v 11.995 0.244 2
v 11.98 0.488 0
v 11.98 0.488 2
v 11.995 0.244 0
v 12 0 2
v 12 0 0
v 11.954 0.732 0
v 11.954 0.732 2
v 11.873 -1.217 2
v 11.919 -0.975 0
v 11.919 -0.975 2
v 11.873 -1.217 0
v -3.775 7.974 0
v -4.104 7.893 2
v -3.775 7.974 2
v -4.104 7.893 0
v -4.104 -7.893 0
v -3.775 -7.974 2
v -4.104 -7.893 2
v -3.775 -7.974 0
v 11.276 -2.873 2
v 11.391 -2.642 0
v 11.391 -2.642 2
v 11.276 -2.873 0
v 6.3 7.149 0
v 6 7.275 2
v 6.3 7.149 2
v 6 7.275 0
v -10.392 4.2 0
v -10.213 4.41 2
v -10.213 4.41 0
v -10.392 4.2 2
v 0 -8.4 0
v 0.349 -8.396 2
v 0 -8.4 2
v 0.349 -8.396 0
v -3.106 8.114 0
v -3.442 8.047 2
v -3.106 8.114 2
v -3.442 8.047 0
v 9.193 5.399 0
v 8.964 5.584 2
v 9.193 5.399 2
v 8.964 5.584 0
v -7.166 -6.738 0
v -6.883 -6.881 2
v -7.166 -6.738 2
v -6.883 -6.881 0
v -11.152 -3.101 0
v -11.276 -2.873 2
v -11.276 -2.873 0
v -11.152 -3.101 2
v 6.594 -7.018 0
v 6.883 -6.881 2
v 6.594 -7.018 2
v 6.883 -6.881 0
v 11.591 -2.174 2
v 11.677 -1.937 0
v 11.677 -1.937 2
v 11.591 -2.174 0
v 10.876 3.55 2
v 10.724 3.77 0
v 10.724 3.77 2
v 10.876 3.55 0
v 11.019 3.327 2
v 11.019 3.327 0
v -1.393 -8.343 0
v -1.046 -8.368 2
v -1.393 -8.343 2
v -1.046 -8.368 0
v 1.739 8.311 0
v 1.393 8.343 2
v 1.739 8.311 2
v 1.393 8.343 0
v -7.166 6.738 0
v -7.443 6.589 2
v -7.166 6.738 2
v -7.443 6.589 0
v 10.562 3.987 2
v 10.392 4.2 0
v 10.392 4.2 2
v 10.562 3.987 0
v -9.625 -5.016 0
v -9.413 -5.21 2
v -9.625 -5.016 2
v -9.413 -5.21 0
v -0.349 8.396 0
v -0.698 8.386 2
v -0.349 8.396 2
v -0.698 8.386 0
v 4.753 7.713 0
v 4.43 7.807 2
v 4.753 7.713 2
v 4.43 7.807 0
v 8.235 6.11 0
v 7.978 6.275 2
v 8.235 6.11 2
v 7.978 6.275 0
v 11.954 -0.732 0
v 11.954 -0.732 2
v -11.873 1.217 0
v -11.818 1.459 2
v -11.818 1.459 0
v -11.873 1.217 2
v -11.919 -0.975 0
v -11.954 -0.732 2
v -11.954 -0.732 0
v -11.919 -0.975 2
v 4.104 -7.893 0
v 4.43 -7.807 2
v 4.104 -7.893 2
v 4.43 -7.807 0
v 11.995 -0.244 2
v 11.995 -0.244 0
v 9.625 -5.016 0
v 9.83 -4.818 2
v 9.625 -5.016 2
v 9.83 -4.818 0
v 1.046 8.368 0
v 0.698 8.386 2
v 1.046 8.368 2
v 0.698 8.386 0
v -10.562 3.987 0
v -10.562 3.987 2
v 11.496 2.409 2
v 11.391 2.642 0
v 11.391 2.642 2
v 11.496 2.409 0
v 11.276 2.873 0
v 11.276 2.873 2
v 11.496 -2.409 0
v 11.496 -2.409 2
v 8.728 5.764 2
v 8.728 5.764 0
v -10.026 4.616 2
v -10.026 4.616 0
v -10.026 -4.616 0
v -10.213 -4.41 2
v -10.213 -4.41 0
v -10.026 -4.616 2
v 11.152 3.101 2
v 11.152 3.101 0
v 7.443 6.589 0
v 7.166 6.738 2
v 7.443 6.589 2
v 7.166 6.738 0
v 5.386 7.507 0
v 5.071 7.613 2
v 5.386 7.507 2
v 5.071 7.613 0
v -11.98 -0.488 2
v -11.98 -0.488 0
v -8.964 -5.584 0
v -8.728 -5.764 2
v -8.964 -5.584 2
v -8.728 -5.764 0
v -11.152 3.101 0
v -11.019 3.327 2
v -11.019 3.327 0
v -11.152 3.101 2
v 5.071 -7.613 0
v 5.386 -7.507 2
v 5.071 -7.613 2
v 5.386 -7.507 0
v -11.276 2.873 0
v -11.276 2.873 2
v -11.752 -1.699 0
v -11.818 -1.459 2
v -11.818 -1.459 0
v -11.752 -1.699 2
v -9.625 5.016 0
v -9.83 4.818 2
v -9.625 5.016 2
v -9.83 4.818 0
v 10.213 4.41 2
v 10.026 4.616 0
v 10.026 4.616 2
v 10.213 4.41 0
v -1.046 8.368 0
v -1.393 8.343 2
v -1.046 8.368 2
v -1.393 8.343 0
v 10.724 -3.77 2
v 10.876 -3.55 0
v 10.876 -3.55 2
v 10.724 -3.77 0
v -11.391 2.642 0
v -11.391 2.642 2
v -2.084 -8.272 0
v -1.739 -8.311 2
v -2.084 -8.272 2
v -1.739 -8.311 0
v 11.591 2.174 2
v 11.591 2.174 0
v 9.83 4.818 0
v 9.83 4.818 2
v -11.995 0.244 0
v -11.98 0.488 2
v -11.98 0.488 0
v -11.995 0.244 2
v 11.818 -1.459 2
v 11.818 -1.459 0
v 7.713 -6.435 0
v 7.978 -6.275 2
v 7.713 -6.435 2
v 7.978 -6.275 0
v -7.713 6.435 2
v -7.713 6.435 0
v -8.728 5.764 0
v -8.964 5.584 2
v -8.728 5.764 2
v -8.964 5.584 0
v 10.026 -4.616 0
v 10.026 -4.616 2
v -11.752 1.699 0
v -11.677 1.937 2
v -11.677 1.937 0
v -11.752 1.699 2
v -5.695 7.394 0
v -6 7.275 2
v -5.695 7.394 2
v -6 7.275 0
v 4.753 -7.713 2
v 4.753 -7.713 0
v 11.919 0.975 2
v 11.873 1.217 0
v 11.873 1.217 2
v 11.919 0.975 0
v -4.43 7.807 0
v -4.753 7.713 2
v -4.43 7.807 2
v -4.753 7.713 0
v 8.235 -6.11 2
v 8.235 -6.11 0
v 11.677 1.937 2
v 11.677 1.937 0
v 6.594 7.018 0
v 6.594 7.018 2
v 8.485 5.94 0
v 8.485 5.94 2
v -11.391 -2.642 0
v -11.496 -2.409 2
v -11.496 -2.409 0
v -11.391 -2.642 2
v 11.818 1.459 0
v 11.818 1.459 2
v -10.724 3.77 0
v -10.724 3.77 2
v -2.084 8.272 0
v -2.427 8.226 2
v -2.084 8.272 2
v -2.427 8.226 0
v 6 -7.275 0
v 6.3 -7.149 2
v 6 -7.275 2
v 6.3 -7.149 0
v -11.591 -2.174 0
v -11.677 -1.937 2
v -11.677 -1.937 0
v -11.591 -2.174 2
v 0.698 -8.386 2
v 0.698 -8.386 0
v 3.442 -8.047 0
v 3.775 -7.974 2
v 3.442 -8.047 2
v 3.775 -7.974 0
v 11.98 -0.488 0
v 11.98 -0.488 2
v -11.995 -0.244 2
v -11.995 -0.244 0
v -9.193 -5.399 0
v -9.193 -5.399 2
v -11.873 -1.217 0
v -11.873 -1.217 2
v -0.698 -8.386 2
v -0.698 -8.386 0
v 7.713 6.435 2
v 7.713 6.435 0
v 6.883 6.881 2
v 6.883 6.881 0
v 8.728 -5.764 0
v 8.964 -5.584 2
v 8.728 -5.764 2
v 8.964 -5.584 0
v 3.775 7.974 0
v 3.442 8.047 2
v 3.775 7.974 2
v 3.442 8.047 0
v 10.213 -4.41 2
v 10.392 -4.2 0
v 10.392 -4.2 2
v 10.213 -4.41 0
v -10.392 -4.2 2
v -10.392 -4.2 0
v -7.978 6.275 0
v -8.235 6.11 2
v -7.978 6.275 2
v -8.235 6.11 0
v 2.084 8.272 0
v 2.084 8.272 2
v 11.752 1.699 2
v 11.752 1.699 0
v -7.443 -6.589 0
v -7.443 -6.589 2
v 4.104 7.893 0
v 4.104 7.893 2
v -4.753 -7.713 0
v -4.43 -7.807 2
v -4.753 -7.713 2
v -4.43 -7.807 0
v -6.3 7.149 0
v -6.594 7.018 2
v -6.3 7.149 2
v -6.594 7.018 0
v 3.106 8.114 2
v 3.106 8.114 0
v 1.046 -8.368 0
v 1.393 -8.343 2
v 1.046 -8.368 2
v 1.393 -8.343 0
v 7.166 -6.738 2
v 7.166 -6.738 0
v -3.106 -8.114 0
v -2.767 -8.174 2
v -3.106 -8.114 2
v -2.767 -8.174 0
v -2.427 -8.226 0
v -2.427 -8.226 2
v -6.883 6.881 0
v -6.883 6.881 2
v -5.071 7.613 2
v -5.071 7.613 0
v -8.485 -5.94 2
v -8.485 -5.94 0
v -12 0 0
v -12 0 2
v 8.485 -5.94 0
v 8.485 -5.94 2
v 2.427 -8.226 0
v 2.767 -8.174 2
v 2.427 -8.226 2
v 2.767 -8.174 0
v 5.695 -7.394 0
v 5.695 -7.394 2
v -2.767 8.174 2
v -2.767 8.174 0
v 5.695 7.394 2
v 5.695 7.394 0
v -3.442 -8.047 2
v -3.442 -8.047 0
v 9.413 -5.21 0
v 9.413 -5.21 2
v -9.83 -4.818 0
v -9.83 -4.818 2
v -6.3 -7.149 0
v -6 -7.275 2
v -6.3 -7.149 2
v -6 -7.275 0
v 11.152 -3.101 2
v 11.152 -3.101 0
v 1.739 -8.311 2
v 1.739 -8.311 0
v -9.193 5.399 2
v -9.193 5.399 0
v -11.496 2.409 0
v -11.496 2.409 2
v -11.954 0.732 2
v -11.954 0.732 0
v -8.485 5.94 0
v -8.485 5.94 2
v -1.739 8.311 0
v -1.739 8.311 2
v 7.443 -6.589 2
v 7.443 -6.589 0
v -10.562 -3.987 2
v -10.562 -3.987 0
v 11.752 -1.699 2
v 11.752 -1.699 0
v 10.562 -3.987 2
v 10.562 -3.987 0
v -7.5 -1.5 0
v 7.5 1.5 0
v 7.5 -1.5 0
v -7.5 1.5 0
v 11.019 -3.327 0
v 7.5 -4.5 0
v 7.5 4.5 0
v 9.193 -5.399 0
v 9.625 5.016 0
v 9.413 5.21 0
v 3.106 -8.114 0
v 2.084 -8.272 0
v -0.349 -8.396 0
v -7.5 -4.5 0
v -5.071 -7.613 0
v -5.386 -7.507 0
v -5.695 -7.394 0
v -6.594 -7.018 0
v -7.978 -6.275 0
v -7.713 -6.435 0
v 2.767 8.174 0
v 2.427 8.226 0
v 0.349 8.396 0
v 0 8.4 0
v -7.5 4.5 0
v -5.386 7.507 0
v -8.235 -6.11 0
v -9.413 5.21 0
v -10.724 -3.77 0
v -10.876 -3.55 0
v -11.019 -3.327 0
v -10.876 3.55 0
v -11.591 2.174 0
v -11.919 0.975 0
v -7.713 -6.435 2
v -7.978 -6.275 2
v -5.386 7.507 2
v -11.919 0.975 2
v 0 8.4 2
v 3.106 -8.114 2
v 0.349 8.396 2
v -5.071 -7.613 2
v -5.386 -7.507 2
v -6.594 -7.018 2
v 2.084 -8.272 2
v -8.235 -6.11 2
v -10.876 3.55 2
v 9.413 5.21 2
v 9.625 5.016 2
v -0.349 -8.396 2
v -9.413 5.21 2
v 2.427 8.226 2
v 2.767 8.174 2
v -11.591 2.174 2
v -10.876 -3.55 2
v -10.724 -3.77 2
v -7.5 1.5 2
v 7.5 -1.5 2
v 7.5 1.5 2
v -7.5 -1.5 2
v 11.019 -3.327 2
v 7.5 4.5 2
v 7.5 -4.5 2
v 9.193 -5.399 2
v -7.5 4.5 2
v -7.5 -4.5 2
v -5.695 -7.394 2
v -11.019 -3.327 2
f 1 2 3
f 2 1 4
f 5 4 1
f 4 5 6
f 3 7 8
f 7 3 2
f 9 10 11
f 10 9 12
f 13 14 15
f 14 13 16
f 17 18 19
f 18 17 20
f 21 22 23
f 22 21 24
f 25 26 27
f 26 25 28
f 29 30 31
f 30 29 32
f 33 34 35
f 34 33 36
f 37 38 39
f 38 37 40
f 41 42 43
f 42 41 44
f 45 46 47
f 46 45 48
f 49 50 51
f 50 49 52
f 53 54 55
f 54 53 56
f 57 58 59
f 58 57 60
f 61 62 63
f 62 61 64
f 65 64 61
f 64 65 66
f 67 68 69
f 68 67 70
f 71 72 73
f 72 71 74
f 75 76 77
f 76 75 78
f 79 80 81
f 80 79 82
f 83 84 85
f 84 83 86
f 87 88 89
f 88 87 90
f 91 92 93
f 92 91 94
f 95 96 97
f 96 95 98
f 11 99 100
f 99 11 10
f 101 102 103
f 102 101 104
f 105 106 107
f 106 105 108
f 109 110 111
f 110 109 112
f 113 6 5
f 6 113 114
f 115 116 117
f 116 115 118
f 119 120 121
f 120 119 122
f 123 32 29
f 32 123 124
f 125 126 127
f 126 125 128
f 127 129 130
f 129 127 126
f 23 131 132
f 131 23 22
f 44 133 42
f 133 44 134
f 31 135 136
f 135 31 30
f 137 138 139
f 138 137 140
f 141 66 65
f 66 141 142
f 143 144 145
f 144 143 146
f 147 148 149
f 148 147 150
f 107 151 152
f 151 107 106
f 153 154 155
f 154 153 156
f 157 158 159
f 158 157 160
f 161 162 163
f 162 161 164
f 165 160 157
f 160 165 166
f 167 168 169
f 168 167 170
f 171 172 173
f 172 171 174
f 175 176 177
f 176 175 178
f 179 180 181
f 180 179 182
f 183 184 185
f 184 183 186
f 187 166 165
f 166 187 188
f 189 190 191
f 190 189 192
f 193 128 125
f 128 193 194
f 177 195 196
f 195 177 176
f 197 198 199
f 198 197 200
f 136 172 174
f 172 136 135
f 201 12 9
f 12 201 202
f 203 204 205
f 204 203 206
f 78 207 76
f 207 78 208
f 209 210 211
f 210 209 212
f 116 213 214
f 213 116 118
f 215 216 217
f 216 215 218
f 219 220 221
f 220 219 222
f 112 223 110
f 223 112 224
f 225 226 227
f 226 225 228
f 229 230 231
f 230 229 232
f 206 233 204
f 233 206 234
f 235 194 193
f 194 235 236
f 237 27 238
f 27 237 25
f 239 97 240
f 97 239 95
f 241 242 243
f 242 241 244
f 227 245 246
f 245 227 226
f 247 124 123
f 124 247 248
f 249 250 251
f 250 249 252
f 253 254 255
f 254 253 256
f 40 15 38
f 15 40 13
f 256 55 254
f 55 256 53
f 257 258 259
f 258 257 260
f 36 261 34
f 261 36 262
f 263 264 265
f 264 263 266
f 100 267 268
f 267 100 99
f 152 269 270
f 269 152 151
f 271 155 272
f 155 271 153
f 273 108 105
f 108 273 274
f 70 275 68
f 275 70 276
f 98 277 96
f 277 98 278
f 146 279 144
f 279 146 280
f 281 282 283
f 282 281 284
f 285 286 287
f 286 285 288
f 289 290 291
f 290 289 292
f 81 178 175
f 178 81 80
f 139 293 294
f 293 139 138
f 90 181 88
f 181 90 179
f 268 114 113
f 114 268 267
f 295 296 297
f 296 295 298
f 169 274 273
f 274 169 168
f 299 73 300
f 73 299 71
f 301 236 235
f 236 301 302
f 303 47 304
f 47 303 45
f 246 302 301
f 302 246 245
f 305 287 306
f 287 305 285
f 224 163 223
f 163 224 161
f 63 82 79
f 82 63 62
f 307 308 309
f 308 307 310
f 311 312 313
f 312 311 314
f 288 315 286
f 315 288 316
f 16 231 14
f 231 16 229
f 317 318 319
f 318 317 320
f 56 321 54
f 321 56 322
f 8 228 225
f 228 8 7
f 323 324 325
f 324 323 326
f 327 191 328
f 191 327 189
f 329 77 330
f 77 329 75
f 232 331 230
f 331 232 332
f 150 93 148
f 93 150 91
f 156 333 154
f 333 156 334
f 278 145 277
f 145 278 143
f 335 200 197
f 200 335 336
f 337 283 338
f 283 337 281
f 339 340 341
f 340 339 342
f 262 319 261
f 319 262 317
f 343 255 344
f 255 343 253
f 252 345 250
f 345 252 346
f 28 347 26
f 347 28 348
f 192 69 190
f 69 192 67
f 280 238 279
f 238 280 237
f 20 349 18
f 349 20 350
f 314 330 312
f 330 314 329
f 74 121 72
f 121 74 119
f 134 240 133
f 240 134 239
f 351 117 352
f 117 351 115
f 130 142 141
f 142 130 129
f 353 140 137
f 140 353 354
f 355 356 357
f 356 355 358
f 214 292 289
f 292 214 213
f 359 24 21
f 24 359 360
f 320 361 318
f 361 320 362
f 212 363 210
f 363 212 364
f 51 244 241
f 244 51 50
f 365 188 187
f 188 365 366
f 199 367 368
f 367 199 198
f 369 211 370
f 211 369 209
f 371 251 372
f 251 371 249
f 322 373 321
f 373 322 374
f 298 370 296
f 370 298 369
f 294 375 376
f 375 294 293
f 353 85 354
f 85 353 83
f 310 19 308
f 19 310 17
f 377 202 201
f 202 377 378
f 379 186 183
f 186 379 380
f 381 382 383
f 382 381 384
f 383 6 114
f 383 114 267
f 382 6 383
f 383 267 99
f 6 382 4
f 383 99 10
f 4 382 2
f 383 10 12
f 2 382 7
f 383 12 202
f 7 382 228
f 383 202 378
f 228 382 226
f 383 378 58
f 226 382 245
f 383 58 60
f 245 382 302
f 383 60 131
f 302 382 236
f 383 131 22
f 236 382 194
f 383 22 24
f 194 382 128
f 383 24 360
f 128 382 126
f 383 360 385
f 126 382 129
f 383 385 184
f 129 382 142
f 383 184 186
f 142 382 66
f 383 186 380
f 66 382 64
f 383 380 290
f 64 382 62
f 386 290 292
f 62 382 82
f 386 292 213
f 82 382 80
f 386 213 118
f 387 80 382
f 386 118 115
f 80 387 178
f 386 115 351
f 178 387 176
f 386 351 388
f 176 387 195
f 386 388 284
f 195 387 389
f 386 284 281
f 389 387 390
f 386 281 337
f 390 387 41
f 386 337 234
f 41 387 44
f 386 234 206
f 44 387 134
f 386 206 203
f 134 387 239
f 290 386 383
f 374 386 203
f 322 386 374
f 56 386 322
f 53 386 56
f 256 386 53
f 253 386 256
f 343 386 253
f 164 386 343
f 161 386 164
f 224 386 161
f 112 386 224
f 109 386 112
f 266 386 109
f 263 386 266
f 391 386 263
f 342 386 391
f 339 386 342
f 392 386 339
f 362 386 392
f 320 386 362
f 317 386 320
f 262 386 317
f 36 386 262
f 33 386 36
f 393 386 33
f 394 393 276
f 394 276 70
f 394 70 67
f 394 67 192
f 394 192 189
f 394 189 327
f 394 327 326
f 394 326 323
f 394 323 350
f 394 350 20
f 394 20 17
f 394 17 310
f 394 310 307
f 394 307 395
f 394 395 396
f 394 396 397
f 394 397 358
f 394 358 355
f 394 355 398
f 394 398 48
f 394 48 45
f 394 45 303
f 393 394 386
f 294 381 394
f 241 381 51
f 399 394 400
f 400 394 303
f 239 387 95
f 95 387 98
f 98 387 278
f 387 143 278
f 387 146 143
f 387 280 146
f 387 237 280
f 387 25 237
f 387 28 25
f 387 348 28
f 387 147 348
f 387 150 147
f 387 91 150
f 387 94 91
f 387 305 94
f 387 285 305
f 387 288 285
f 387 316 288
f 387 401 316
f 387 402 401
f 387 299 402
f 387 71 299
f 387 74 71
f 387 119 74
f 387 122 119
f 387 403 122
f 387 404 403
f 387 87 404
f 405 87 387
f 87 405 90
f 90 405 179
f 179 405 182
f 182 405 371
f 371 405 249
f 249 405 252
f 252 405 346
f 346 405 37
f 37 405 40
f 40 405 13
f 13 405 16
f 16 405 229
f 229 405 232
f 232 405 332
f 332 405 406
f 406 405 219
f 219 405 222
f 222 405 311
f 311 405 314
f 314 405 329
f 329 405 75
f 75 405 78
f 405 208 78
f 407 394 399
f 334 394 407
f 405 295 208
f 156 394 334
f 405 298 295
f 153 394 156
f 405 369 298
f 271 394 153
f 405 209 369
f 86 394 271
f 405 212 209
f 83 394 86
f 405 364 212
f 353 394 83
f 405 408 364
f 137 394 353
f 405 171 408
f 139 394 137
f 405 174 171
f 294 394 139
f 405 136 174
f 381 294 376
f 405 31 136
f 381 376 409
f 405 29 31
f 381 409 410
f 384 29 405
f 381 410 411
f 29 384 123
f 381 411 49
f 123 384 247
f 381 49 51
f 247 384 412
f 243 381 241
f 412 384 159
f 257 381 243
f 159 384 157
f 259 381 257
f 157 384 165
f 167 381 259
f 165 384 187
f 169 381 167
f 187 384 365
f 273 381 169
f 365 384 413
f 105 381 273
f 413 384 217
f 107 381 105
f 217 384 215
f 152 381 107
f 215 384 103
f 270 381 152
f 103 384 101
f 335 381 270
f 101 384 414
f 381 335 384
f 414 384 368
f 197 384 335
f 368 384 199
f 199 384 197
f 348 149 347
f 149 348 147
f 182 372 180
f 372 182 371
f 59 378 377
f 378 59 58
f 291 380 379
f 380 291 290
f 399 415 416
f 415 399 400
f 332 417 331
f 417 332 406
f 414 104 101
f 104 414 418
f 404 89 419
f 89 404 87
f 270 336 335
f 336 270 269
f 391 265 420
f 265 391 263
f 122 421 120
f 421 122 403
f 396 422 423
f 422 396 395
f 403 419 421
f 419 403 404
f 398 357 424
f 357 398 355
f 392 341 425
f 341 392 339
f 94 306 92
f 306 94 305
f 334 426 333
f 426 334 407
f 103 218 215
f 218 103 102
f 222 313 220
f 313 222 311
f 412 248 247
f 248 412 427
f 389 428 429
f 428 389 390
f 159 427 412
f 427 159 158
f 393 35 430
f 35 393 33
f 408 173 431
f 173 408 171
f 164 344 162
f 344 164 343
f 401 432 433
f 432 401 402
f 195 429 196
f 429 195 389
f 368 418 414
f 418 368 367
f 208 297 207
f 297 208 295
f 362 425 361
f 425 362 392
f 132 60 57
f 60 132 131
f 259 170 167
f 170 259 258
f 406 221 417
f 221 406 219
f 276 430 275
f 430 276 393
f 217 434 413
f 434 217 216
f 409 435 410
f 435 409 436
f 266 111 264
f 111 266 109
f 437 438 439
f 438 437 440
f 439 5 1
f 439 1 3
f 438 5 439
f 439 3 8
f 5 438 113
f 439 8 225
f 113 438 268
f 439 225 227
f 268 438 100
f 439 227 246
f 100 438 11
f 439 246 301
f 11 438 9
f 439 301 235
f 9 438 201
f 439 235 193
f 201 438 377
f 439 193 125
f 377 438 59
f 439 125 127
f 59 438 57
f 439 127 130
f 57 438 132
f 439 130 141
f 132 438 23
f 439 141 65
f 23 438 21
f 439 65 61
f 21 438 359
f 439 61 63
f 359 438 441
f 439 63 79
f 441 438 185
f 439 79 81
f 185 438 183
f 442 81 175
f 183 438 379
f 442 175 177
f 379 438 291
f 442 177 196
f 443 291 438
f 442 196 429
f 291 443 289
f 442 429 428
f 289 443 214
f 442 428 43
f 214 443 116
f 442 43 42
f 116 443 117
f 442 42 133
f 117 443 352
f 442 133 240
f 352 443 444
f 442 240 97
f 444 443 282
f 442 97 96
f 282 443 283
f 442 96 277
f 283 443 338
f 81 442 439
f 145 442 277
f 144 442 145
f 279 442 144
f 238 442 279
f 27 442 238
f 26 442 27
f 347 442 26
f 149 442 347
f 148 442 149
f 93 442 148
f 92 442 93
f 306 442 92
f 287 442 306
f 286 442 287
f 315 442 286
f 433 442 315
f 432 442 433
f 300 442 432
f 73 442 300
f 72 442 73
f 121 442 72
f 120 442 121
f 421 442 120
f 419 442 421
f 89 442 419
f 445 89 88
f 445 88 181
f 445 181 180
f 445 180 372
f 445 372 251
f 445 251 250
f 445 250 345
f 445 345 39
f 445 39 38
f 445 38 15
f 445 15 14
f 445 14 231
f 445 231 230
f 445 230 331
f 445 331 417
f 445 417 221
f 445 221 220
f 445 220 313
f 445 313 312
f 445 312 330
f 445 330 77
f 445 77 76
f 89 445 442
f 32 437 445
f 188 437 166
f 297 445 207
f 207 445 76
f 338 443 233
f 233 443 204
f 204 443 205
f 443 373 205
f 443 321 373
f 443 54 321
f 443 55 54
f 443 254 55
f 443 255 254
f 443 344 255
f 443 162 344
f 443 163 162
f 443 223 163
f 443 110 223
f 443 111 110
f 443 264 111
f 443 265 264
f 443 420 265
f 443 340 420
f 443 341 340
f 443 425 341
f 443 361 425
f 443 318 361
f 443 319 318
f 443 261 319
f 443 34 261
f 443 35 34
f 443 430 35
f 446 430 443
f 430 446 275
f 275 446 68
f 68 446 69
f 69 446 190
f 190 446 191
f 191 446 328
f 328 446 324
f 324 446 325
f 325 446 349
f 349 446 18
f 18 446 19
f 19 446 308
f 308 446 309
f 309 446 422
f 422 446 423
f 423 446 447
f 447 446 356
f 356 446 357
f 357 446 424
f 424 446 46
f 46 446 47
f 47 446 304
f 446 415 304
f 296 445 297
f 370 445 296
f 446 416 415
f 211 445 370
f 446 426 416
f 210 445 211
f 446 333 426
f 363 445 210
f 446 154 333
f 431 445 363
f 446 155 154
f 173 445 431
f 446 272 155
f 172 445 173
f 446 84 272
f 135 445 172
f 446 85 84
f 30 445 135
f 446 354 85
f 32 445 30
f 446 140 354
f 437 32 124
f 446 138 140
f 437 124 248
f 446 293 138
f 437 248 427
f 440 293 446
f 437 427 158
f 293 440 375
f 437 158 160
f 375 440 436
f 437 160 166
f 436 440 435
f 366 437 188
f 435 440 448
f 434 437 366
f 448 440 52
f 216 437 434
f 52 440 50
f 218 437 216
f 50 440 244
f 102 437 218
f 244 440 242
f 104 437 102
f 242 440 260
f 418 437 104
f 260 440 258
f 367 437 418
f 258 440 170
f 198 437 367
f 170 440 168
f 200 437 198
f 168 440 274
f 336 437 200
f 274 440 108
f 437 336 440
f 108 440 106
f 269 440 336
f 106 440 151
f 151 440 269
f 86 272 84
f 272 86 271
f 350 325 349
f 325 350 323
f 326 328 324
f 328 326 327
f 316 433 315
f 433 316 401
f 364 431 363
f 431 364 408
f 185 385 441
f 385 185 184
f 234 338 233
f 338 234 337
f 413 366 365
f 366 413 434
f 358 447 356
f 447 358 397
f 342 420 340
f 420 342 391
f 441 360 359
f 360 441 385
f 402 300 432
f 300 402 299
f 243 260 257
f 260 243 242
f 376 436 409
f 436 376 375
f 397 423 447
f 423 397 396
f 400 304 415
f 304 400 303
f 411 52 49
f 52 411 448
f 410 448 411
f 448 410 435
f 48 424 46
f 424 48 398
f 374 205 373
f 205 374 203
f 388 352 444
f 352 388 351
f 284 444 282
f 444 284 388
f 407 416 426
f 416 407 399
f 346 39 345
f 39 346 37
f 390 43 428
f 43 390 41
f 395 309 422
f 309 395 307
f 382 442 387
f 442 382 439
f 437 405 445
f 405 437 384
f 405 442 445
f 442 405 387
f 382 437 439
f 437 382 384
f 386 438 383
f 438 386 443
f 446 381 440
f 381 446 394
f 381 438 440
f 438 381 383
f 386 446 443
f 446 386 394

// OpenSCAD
$fs=0.35; $fa=1;

//Adjustment for making holes go all the way
bump=.1;

//Width of the actual buckle [mm]
buckle_width=24;//mm
buckle_radius=buckle_width/2;
//Width of the slot, long way [mm]
slot_width  =15;//mm
//Height of the slot, short way [mm]
slot_height = 3;//mm
//Thickness of the buckle [mm]
thickness   = 2;//mm
//How close to a circle should the buckle be?
ovaltine=70; // [02:100]


difference(){
scale([1,ovaltine/100,1])
cylinder(r=buckle_radius,h=thickness);

translate([-slot_width/2,slot_height-slot_height/2,-bump])
cube([slot_width,slot_height,thickness+2*bump]);

translate([-slot_width/2,-slot_height-slot_height/2,-bump])
cube([slot_width,slot_height,thickness+2*bump]);

}
